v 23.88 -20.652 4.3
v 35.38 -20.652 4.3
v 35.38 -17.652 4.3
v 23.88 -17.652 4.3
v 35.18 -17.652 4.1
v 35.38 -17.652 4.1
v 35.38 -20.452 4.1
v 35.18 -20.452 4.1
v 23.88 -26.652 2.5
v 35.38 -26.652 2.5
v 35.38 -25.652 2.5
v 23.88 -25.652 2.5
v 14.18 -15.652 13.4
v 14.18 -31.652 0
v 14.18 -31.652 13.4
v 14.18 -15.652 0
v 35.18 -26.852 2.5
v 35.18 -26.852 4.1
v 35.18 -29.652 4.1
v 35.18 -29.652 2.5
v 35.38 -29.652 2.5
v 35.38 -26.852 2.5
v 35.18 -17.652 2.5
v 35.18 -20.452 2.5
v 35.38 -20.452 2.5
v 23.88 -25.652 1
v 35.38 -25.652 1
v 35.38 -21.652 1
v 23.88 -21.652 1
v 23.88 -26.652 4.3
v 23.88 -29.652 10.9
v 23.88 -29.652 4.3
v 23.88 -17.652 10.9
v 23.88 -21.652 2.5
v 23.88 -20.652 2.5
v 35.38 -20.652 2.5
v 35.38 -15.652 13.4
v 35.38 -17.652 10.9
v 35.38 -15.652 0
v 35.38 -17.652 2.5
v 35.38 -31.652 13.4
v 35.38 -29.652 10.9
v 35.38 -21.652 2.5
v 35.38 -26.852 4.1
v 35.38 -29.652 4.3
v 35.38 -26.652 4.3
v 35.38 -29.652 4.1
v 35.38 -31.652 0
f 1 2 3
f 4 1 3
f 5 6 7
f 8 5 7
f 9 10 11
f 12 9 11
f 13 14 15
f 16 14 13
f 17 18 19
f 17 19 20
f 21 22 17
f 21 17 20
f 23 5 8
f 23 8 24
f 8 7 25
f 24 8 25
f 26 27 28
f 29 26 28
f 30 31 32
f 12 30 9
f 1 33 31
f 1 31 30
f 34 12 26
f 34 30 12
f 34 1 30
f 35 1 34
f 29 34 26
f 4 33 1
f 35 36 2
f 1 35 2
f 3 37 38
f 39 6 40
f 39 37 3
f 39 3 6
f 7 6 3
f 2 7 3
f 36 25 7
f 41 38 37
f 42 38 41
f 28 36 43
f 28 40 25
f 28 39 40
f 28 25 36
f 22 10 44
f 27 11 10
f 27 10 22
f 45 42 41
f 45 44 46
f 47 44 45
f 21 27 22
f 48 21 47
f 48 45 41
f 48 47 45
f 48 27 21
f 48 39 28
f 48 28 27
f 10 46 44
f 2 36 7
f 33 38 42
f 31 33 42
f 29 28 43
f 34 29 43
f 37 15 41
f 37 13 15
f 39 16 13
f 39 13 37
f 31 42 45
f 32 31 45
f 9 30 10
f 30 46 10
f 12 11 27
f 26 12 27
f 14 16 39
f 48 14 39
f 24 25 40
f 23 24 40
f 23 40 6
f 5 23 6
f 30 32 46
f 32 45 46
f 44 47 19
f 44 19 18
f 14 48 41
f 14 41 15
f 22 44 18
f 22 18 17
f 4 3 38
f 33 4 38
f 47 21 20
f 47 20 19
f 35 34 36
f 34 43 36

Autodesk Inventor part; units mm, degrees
ref_plane "YZ Plane" through (0, 0, 0) normal (1, 0, 0) x (0, 1, 0)
ref_plane "XZ Plane" through (0, 0, 0) normal (0, 1, 0) x (-1, 0, 0)
ref_plane "XY Plane" through (0, 0, 0) normal (0, 0, 1) x (1, 0, 0)
ref_plane "Work Plane1" through (0, 0, 0) normal (0, 0, 1) x (1, 0, 0)
sketch "Sketch1" plane through (0, 0, 0) normal (0, 0, 1) x (1, 0, 0)
  line L0 (14.1799, -15.6518) -> (35.3799, -15.6518)
  line L1 (35.3799, -15.6518) -> (35.3799, -31.6518)
  line L2 (35.3799, -31.6518) -> (14.1799, -31.6518)
  line L3 (14.1799, -31.6518) -> (14.1799, -15.6518)
  point P0 (0, 0)
  dimension "d0" = 21.2
  dimension "d2" = 16
extrude "Extrusion1" add sketch "Sketch1" along normal blind 13.4
sketch "Sketch2" plane through (35.3799, -31.6518, 0) normal (1, 0, 0) x (0, 0, -1)
  line L0 (0, 16) -> (0, 0) projected
  line L1 (0, 16) -> (-13.4, 16) projected
  line L2 (-13.4, 0) -> (-13.4, 16) projected
  line L3 (0, 0) -> (-13.4, 0) projected
  line L4 (-10.9, 2) -> (-4.3, 2)
  line L5 (-4.3, 2) -> (-4.3, 5)
  line L6 (-4.3, 5) -> (-2.5, 5)
  line L7 (-2.5, 5) -> (-2.5, 6)
  line L8 (-2.5, 6) -> (-1, 6)
  line L9 (-1, 6) -> (-1, 10)
  line L10 (-1, 10) -> (-2.5, 10)
  line L11 (-2.5, 10) -> (-2.5, 11)
  line L12 (-2.5, 11) -> (-4.3, 11)
  line L13 (-4.3, 11) -> (-4.3, 14)
  line L14 (-4.3, 14) -> (-10.9, 14)
  line L15 (-10.9, 14) -> (-10.9, 2)
  point P0 (0, 31.6518)
  dimension "d5" = 2
  dimension "d6" = 2
  dimension "d7" = 2.5
  dimension "d8" = 5
  dimension "d9" = 6
  dimension "d10" = 1
  dimension "d11" = 2.5
  dimension "d12" = 4.3
extrude "Extrusion2" cut sketch "Sketch2" against normal blind 11.5 contours L15 L14 L13 L12 L11 L10 L9 L8 L7 L6 L5 L4
sketch "Sketch3" plane through (35.3799, -31.6518, 0) normal (1, 0, 0) x (0, 0, -1)
  line L0 (-4.3, 5) -> (-4.3, 2) projected
  line L1 (-4.3, 2) -> (-10.9, 2) projected
  line L2 (-10.9, 14) -> (-4.3, 14) projected
  line L3 (-4.3, 14) -> (-4.3, 11) projected
  line L4 (-4.3, 11) -> (-2.5, 11) projected
  line L5 (-2.5, 5) -> (-4.3, 5) projected
  line L6 (-4.1, 4.8) -> (-2.5, 4.8)
  line L7 (-2.5, 4.8) -> (-2.5, 2)
  line L8 (-2.5, 2) -> (-4.1, 2)
  line L9 (-4.1, 2) -> (-4.1, 4.8)
  line L10 (-4.1, 11.2) -> (-2.5, 11.2)
  line L11 (-2.5, 11.2) -> (-2.5, 14)
  line L12 (-2.5, 14) -> (-4.1, 14)
  line L13 (-4.1, 14) -> (-4.1, 11.2)
  point P0 (0, 31.6518)
  dimension "d15" = 0.2
  dimension "d16" = 0.2
  dimension "d17" = 0.2
  dimension "d18" = 0.2
extrude "Extrusion3" cut sketch "Sketch3" against normal blind 0.2
properties part number "nanopc_t4_rj45"
